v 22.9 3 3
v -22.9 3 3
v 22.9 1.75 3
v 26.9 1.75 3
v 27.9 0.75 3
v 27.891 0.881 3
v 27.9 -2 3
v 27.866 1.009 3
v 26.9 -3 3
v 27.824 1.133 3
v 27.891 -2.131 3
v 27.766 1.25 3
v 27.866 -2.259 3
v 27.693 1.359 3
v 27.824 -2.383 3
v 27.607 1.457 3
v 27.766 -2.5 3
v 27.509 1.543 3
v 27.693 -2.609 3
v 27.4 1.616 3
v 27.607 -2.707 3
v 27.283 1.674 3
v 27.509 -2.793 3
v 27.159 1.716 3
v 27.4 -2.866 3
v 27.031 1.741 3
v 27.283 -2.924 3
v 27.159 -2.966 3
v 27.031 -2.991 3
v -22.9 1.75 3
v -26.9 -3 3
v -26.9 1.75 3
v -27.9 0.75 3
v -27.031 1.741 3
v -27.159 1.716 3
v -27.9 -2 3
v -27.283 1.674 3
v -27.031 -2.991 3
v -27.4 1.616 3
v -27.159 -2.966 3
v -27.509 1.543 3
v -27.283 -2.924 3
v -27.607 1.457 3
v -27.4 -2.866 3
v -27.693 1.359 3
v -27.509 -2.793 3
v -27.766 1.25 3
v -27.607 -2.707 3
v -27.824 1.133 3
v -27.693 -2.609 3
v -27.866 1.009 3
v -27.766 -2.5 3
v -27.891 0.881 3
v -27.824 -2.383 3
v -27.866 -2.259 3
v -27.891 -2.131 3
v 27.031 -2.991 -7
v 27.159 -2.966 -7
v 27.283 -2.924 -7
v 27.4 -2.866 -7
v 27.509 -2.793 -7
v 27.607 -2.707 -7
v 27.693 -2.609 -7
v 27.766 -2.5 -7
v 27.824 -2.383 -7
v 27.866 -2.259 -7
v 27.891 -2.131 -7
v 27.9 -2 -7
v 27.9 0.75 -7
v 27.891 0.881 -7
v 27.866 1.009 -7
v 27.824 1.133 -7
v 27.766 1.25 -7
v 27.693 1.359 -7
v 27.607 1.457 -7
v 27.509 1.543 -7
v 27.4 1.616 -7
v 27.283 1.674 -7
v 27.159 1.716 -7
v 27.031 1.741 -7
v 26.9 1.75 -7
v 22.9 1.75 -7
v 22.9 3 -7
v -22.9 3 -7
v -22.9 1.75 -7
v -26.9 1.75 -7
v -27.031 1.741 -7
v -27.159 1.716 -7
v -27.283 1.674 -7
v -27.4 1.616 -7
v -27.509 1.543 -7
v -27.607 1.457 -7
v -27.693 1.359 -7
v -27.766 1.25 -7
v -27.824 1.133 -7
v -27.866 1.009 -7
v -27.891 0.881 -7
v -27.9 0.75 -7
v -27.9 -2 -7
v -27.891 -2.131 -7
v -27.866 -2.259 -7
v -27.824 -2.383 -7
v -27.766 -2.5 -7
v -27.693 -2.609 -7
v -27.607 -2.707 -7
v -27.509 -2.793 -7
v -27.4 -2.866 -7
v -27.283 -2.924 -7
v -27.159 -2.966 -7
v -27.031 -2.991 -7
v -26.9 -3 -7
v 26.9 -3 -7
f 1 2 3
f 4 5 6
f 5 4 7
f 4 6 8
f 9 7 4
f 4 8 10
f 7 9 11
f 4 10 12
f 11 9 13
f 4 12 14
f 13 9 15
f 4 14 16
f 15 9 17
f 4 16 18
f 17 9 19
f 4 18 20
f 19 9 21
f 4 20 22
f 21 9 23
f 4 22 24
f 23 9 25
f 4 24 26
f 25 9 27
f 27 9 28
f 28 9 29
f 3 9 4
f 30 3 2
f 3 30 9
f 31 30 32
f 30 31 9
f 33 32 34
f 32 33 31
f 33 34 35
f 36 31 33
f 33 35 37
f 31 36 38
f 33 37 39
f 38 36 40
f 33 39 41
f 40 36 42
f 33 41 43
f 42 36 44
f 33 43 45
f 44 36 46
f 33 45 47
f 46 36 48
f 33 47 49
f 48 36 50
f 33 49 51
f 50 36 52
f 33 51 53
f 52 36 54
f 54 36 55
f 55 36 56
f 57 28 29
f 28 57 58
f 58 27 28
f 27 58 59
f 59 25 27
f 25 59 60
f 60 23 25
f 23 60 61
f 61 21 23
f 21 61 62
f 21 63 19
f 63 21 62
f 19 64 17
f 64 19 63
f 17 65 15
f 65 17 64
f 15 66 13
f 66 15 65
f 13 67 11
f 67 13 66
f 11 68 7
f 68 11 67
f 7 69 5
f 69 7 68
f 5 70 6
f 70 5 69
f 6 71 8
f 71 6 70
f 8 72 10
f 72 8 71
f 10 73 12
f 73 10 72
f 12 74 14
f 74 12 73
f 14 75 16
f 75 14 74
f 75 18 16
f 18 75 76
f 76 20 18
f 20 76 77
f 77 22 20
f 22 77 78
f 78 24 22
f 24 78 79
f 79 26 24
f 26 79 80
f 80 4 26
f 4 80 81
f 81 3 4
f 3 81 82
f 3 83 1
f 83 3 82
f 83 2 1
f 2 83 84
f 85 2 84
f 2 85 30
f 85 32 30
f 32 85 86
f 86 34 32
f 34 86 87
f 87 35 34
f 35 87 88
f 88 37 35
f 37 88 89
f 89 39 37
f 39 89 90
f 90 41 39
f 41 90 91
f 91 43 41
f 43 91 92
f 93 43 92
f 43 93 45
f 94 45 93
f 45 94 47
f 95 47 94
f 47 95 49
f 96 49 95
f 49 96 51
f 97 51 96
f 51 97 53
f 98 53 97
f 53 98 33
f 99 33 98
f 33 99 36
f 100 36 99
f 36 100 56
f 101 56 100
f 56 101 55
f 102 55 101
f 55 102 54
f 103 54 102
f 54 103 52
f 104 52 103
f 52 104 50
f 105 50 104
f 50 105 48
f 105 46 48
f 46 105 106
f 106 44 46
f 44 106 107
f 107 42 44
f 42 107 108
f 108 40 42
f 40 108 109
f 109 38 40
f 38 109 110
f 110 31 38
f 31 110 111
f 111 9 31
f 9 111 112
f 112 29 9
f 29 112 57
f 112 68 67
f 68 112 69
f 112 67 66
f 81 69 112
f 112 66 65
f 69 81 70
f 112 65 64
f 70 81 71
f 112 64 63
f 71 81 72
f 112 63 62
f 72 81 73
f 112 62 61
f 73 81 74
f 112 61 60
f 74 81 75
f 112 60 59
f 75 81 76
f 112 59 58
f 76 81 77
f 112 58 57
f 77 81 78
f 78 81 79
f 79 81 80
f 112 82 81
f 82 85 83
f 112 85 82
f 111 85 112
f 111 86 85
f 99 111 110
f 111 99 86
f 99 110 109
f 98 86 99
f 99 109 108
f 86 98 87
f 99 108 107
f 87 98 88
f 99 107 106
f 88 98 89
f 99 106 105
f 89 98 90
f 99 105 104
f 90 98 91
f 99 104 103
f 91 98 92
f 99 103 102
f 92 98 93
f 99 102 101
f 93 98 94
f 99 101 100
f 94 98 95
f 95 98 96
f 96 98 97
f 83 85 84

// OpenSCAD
//
// Final enclosure interface model
// 12-position, 3.81 mm pitch pluggable terminal block
//
// Correct shape:
//   • full outer silhouette used for enclosure cutout
//   • lowered top sections on the OUTER 5 mm of each side
//   • raised full-height center section
//   • R1 fillets on all four OUTER corners
//   • optional 3D reference model
//

// ---------------- Parameters ----------------

pins = 12;
pitch = 3.81;

// From drawing
body_w = pins * pitch + 0.88;
ear_each = 4.60;

// Measured
overall_h = 6.00;      // full center height
outer_notch_w = 5.00;  // lowered region width from each outer edge
notch_d = 1.25;        // amount lowered from the top
corner_r = 1.00;

// Simplified 3D reference depth
body_depth   = 7.0;
flange_thick = 3.0;

// User-adjustable
clearance = 0.20;


// ---------------- Derived ----------------

overall_w = body_w + 2 * ear_each;


// ---------------- Helpers ----------------

function arc_pts(cx, cy, r, a1, a2, n=12) =
    [ for (i = [0:n])
        let(a = a1 + (a2 - a1) * i / n)
        [cx + r * cos(a), cy + r * sin(a)]
    ];


// ---------------- 2D Profile ----------------

module panel_cutout_profile(extra = 0) {
    w  = overall_w + 2*extra;
    h  = overall_h + 2*extra;
    nw = outer_notch_w + extra;
    nd = notch_d + extra;
    r  = corner_r + extra;

    xL = -w/2;
    xR =  w/2;
    yB = -h/2;
    yT =  h/2;        // full-height center top
    yN = yT - nd;     // lowered outer-top level

    pts = concat(
        // bottom edge
        [[xL + r, yB]],
        [[xR - r, yB]],

        // bottom-right radius
        arc_pts(xR - r, yB + r, r, -90, 0),

        // right side up to lowered-top radius start
        [[xR, yN - r]],

        // top-right outer radius (to lowered top)
        arc_pts(xR - r, yN - r, r, 0, 90),

        // lowered right outer section
        [[xR - nw, yN]],

        // step up to full-height center
        [[xR - nw, yT]],

        // full-height center top
        [[xL + nw, yT]],

        // step down to lowered left outer section
        [[xL + nw, yN]],

        // lowered left outer section
        [[xL + r, yN]],

        // top-left outer radius (from lowered top to left side)
        arc_pts(xL + r, yN - r, r, 90, 180),

        // left side down to bottom-left radius start
        [[xL, yB + r]],

        // bottom-left radius
        arc_pts(xL + r, yB + r, r, 180, 270)
    );

    polygon(points = pts);
}


// ---------------- 3D Reference ----------------

module connector_reference_3d() {
    union() {
        linear_extrude(height = flange_thick)
            panel_cutout_profile();

        translate([0, 0, -body_depth])
            linear_extrude(height = body_depth)
                panel_cutout_profile();
    }
}


// ---------------- Output ----------------

// 3D reference model
connector_reference_3d();

// 2D enclosure cutout instead:
// panel_cutout_profile(clearance);
